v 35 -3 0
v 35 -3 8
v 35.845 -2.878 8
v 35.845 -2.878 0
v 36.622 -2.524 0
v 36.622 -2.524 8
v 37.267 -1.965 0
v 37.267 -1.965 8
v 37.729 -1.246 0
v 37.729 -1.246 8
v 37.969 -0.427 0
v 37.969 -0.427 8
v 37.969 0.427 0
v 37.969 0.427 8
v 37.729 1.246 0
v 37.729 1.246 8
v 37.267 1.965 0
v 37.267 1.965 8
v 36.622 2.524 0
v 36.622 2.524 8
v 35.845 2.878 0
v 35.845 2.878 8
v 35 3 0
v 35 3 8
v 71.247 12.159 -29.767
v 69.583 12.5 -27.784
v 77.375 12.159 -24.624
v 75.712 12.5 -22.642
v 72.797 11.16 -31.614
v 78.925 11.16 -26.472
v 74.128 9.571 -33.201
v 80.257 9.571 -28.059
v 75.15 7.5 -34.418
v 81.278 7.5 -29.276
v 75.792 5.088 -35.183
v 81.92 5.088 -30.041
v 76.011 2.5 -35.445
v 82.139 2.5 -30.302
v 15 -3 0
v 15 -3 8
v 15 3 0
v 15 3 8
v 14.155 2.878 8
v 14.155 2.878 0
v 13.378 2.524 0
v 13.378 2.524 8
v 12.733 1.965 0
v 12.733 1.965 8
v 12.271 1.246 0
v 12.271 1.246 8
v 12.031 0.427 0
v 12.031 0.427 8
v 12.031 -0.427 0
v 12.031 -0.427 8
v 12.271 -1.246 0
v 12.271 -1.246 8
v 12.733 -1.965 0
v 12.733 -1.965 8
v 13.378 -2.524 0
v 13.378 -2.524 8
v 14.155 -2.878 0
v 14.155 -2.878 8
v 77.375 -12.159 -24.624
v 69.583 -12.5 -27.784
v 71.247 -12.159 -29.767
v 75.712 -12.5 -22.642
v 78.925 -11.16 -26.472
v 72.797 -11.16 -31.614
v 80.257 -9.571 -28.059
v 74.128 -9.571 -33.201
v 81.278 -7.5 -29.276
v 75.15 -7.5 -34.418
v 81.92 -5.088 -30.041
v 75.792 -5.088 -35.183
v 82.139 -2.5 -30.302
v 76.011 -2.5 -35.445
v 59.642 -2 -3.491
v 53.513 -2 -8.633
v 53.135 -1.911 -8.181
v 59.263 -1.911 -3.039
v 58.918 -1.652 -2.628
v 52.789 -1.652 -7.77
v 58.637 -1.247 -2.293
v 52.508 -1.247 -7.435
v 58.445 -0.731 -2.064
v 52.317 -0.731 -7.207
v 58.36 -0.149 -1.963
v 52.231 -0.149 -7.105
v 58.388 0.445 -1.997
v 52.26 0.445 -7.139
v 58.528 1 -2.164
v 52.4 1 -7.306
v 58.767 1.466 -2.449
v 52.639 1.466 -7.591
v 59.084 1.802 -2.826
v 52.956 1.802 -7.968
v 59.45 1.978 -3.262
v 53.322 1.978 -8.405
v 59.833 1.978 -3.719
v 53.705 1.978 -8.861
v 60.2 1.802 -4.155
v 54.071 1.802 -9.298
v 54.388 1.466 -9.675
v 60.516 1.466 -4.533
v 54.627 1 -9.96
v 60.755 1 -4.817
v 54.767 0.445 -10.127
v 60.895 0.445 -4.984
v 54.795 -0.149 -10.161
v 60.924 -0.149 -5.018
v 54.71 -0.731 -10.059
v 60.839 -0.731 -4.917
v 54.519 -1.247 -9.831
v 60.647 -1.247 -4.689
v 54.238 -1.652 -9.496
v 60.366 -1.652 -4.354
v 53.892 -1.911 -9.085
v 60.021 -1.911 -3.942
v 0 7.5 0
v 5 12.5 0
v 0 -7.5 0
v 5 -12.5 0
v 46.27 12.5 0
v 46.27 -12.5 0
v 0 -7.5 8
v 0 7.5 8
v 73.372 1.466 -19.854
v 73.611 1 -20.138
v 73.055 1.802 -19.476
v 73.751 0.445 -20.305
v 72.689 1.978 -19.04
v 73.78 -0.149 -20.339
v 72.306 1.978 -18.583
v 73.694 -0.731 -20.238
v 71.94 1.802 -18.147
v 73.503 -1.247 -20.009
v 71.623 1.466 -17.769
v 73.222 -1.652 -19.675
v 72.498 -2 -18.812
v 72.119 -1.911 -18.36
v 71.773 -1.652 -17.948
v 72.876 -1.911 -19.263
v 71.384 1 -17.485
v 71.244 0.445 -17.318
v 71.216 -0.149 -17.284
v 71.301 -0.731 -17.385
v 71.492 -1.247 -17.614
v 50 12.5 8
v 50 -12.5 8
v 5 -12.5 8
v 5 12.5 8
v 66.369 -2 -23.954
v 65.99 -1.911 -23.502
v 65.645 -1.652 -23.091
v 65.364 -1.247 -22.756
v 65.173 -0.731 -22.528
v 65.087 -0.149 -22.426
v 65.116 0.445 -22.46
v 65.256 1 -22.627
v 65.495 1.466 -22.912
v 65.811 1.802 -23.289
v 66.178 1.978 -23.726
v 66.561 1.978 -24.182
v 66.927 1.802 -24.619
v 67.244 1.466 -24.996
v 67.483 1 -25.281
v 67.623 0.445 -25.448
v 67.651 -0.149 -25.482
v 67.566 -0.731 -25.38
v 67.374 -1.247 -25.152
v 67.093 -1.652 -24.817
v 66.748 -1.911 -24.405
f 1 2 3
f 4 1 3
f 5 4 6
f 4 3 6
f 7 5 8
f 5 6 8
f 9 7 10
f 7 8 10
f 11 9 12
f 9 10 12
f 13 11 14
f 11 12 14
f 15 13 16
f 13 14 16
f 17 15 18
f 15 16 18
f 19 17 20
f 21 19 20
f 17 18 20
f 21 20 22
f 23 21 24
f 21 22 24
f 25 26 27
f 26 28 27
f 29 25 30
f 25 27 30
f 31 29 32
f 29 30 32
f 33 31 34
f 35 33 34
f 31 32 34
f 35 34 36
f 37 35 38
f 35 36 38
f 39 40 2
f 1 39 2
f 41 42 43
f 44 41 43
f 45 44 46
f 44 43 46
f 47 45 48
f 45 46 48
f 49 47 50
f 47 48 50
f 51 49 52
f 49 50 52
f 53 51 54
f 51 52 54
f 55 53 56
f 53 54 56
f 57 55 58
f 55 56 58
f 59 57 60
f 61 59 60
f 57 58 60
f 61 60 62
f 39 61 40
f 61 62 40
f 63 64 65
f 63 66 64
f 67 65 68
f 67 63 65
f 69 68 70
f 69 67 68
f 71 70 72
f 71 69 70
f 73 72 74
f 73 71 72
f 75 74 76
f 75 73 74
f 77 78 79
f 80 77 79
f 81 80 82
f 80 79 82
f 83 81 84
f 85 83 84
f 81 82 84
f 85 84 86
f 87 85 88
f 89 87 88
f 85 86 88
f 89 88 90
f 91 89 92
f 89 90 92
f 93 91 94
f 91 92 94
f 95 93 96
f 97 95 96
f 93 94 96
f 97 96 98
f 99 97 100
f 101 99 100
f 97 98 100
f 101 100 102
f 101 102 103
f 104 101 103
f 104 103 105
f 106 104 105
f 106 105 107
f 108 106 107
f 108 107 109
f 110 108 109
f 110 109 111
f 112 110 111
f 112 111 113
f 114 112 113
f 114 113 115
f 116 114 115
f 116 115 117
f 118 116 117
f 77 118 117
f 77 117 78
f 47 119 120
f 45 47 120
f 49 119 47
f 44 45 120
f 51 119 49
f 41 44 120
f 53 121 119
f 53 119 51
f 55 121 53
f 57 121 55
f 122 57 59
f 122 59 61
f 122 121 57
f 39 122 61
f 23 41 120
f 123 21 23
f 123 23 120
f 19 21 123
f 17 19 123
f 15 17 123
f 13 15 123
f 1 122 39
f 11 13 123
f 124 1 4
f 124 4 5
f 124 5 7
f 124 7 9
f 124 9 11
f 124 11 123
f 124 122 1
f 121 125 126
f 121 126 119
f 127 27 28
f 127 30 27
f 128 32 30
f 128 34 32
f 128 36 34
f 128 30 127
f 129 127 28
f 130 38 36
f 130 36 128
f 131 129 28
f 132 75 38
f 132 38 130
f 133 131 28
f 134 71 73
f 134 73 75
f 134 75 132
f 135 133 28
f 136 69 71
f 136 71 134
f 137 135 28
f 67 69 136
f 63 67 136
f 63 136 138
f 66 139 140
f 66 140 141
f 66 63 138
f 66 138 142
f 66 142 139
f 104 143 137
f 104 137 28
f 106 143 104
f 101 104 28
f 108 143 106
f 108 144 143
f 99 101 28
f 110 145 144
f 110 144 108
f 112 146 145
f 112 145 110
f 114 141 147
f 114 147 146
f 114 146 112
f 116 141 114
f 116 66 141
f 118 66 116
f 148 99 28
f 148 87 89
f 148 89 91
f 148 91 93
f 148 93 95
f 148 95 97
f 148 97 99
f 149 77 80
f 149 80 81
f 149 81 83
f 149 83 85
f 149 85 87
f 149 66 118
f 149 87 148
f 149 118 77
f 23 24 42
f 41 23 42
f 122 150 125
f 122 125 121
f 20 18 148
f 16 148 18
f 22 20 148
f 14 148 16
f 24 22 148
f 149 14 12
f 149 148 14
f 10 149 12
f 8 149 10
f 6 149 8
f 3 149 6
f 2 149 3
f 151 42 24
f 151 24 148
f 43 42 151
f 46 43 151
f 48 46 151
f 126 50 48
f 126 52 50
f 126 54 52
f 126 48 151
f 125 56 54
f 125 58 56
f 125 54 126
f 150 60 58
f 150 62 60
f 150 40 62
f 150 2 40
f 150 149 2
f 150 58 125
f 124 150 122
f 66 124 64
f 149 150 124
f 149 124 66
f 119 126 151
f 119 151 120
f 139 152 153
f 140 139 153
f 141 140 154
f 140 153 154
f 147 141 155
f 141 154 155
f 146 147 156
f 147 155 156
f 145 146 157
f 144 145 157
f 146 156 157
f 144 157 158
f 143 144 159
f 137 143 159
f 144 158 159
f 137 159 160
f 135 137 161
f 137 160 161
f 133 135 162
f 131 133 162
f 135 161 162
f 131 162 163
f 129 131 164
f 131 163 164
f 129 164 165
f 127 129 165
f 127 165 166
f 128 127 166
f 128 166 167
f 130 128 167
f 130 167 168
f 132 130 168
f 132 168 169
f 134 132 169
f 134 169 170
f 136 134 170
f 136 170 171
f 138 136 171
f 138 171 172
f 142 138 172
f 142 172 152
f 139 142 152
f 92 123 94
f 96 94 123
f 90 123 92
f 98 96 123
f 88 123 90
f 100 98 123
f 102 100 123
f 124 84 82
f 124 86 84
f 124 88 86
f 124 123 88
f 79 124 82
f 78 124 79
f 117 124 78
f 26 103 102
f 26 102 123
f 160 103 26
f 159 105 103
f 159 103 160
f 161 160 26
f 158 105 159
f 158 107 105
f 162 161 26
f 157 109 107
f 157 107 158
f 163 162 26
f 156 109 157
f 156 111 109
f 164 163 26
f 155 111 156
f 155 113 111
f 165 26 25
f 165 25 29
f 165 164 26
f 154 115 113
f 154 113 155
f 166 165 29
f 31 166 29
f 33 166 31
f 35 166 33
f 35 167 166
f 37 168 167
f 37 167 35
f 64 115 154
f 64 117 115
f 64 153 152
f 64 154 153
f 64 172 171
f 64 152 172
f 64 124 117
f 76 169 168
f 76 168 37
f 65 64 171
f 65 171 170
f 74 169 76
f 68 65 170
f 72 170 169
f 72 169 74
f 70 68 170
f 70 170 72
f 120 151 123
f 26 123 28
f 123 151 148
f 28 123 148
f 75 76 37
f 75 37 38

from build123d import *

# Parameters (mm, degrees)
F1_DEPTH = 12.5
F3_DEPTH = 43.4455230334
F5_D     = 4
F6_R     = 10
F7_SIZE  = 5


with BuildPart() as f1:
    # F0 (on Front) → F1 (new body, symmetric)
    with BuildSketch(Plane.XZ):
        Polygon((0, 8), (0, 0), (46.2695387348, 0), (76.0110249394, -35.4445230334), (82.1393804843, -30.3022221559), (50, 8), align=None)
    extrude(amount=F1_DEPTH, both=True)

    # F2 (on face) → F3 (cut, through all)
    with BuildSketch(Plane.XY.offset(8)):
        with BuildLine():
            ThreePointArc((15, 3), (12, 0), (15, -3))
            Line((15, -3), (35, -3))
            ThreePointArc((35, -3), (38, 0), (35, 3))
            Line((35, 3), (15, 3))
        make_face()
    extrude(amount=-F3_DEPTH, mode=Mode.SUBTRACT)

    # F5 (through all)
    with Locations(Plane(origin=(33.2804354537, 0, 27.9256011146), x_dir=(0, 1, 0), z_dir=(0.7660444431, 0, 0.6427876097))):
        with Locations((0, -41.0110249394), (0, -61.0110249394)):
            Hole(F5_D / 2)

    # F6
    f6_edges = [f1.edges().sort_by_distance(p)[0] for p in [
        (79.075203, -12.5, -32.873373),
        (79.075203, 12.5, -32.873373),
    ]]
    fillet(f6_edges, radius=F6_R)

    # F7
    f7_edges = [f1.edges().sort_by_distance(p)[0] for p in [
        (0, -12.5, 4),
        (0, 12.5, 4),
    ]]
    chamfer(f7_edges, length=F7_SIZE)


solid = f1.part
